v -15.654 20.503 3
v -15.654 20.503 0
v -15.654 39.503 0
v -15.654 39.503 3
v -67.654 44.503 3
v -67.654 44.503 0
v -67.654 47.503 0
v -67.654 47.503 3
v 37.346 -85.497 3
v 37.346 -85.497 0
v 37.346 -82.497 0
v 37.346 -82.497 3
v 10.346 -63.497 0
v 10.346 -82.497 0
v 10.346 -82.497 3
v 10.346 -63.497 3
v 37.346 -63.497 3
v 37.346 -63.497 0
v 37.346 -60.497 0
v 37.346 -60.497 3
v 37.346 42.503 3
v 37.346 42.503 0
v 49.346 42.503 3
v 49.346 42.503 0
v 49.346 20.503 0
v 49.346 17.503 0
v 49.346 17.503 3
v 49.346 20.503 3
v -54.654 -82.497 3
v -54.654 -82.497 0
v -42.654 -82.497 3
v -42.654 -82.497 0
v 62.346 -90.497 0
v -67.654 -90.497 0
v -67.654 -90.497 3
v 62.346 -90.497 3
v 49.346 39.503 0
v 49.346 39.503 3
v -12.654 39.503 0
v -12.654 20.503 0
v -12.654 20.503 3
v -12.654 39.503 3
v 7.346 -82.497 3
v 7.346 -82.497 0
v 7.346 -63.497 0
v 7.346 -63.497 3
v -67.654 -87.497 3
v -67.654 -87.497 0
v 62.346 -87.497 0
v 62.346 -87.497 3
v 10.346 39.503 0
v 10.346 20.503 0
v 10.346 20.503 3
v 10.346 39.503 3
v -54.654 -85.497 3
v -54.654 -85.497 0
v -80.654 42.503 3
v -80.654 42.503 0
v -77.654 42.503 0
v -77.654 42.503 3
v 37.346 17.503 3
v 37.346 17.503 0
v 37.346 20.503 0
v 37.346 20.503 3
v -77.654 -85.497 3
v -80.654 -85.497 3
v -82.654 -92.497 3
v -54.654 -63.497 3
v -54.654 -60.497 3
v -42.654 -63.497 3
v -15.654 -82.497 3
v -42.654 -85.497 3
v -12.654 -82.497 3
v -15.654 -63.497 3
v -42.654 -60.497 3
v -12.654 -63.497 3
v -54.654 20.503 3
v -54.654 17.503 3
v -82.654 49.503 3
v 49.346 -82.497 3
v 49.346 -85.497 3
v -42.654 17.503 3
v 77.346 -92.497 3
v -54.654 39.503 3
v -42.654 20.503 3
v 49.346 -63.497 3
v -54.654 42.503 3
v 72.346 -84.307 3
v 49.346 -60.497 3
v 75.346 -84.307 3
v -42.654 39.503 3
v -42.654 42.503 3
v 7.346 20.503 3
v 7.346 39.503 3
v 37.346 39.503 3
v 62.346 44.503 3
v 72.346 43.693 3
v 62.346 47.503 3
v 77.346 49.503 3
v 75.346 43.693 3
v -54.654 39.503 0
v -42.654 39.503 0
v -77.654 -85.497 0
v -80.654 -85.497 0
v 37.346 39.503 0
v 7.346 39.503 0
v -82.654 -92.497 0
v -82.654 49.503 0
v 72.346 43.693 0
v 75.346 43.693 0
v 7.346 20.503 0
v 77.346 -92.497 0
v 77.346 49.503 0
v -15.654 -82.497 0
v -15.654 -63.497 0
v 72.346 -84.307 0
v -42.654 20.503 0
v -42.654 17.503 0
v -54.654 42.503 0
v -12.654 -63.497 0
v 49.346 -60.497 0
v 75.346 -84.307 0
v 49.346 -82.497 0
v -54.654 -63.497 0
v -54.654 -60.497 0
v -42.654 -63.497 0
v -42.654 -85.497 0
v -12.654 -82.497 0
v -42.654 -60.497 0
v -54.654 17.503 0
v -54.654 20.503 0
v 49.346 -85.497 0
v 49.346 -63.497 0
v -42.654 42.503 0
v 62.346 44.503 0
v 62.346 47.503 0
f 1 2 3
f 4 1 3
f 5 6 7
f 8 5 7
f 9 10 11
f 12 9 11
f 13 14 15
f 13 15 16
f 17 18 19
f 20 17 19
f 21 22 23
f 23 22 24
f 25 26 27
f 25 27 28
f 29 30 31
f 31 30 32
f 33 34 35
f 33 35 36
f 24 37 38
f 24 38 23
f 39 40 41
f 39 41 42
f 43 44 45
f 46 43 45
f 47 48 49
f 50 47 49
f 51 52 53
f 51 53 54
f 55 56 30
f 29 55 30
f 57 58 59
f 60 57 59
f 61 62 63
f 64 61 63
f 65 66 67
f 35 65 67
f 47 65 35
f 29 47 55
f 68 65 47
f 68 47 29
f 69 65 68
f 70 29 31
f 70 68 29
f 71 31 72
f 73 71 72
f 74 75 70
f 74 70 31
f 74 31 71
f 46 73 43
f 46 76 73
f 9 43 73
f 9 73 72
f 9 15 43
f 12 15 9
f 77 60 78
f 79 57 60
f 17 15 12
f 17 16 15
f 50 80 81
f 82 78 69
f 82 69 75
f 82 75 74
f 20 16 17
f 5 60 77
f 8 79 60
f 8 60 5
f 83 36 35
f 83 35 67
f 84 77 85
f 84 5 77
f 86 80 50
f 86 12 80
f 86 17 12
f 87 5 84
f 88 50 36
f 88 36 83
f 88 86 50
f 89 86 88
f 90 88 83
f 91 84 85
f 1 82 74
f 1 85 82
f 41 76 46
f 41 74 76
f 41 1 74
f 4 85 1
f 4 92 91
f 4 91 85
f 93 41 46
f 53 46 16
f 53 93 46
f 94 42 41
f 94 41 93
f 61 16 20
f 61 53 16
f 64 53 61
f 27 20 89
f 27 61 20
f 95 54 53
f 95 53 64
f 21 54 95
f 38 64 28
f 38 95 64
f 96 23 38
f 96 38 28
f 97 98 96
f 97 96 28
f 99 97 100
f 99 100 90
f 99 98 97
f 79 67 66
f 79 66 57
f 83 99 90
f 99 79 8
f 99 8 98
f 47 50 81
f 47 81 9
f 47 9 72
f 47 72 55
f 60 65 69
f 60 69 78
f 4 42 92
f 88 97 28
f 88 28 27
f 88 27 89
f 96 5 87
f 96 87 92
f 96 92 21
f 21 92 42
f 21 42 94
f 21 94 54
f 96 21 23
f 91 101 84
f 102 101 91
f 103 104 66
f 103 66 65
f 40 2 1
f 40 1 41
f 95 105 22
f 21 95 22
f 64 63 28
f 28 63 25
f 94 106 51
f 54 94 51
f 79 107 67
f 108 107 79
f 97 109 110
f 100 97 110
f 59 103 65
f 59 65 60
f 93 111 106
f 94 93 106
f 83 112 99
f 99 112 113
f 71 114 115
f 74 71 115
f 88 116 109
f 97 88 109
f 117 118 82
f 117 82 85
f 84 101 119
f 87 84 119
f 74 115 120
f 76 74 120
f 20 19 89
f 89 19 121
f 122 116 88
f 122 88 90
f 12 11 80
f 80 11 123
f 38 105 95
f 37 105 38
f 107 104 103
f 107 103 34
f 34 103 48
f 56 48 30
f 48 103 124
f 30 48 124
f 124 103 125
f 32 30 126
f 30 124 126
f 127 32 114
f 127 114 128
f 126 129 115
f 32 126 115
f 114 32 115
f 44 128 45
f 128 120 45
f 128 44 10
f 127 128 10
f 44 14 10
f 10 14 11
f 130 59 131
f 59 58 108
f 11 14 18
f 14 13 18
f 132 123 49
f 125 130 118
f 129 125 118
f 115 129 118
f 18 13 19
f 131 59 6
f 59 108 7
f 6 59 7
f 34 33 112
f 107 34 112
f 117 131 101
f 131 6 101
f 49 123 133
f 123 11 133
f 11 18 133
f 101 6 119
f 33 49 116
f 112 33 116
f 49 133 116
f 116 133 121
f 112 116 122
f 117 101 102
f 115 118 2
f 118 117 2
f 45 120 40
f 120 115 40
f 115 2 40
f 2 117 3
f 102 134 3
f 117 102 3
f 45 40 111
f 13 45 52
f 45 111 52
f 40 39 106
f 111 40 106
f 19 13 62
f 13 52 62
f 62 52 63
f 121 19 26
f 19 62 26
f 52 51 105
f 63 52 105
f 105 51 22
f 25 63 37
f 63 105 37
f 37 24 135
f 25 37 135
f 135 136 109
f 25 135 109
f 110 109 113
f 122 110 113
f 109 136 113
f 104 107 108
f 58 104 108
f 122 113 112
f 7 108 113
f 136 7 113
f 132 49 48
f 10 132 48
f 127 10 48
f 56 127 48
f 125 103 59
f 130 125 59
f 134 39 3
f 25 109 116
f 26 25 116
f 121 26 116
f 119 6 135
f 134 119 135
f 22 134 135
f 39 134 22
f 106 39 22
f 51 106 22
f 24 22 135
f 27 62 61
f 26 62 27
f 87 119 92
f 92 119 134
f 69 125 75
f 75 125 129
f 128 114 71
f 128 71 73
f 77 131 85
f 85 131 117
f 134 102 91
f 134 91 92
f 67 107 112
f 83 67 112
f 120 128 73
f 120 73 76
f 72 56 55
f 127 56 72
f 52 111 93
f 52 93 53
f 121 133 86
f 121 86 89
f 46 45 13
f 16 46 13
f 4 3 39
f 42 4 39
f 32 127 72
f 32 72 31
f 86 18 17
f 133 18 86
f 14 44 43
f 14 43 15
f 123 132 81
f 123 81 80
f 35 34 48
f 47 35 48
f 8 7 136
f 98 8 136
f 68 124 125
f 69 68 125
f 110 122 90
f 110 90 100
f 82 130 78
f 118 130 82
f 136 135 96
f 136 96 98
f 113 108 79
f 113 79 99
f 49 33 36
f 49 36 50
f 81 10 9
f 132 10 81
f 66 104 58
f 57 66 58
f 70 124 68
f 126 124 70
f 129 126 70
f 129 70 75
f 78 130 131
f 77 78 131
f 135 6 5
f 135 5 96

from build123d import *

# Parameters (mm, degrees)
SKETCH1_W           = 160
SKETCH1_H           = 142
SKETCH1_W_2         = 130
SKETCH1_H_2         = 3
SKETCH1_W_3         = 3
SKETCH1_H_3         = 128
SKETCH1_W_4         = 12
SKETCH1_H_4         = 19
BOSS_EXTRUDE1_DEPTH = 3


with BuildPart() as part:
    # Sketch1 → Boss-Extrude1 (new body)
    with BuildSketch(Plane.XY):
        with Locations((-2.653971439, -21.497313052)):
            Rectangle(SKETCH1_W, SKETCH1_H)
        with Locations((-2.653971439, -88.997313052)):
            Rectangle(SKETCH1_W_2, SKETCH1_H_2, mode=Mode.SUBTRACT)
        with Locations((-2.653971439, 46.002686948)):
            Rectangle(SKETCH1_W_2, SKETCH1_H_2, mode=Mode.SUBTRACT)
        with Locations((-79.153971439, -21.497313052)):
            Rectangle(SKETCH1_W_3, SKETCH1_H_3, mode=Mode.SUBTRACT)
        with Locations((73.846028561, -20.307455235)):
            Rectangle(SKETCH1_W_3, SKETCH1_H_3, mode=Mode.SUBTRACT)
        with Locations((43.346028561, -61.997313052)):
            Rectangle(SKETCH1_W_4, SKETCH1_H_2, mode=Mode.SUBTRACT)
        with Locations((43.346028561, -83.997313052)):
            Rectangle(SKETCH1_W_4, SKETCH1_H_2, mode=Mode.SUBTRACT)
        with Locations((43.346028561, 41.002686948)):
            Rectangle(SKETCH1_W_4, SKETCH1_H_2, mode=Mode.SUBTRACT)
        with Locations((8.846028561, -72.997313052)):
            Rectangle(SKETCH1_W_3, SKETCH1_H_4, mode=Mode.SUBTRACT)
        with Locations((43.346028561, 19.002686948)):
            Rectangle(SKETCH1_W_4, SKETCH1_H_2, mode=Mode.SUBTRACT)
        with Locations((8.846028561, 30.002686948)):
            Rectangle(SKETCH1_W_3, SKETCH1_H_4, mode=Mode.SUBTRACT)
        with Locations((-14.153971439, -72.997313052)):
            Rectangle(SKETCH1_W_3, SKETCH1_H_4, mode=Mode.SUBTRACT)
        with Locations((-48.653971439, -83.997313052)):
            Rectangle(SKETCH1_W_4, SKETCH1_H_2, mode=Mode.SUBTRACT)
        with Locations((-48.653971439, -61.997313052)):
            Rectangle(SKETCH1_W_4, SKETCH1_H_2, mode=Mode.SUBTRACT)
        with Locations((-48.653971439, 19.002686948)):
            Rectangle(SKETCH1_W_4, SKETCH1_H_2, mode=Mode.SUBTRACT)
        with Locations((-48.653971439, 41.002686948)):
            Rectangle(SKETCH1_W_4, SKETCH1_H_2, mode=Mode.SUBTRACT)
        with Locations((-14.153971439, 30.002686948)):
            Rectangle(SKETCH1_W_3, SKETCH1_H_4, mode=Mode.SUBTRACT)
    extrude(amount=BOSS_EXTRUDE1_DEPTH)


solid = part.part
